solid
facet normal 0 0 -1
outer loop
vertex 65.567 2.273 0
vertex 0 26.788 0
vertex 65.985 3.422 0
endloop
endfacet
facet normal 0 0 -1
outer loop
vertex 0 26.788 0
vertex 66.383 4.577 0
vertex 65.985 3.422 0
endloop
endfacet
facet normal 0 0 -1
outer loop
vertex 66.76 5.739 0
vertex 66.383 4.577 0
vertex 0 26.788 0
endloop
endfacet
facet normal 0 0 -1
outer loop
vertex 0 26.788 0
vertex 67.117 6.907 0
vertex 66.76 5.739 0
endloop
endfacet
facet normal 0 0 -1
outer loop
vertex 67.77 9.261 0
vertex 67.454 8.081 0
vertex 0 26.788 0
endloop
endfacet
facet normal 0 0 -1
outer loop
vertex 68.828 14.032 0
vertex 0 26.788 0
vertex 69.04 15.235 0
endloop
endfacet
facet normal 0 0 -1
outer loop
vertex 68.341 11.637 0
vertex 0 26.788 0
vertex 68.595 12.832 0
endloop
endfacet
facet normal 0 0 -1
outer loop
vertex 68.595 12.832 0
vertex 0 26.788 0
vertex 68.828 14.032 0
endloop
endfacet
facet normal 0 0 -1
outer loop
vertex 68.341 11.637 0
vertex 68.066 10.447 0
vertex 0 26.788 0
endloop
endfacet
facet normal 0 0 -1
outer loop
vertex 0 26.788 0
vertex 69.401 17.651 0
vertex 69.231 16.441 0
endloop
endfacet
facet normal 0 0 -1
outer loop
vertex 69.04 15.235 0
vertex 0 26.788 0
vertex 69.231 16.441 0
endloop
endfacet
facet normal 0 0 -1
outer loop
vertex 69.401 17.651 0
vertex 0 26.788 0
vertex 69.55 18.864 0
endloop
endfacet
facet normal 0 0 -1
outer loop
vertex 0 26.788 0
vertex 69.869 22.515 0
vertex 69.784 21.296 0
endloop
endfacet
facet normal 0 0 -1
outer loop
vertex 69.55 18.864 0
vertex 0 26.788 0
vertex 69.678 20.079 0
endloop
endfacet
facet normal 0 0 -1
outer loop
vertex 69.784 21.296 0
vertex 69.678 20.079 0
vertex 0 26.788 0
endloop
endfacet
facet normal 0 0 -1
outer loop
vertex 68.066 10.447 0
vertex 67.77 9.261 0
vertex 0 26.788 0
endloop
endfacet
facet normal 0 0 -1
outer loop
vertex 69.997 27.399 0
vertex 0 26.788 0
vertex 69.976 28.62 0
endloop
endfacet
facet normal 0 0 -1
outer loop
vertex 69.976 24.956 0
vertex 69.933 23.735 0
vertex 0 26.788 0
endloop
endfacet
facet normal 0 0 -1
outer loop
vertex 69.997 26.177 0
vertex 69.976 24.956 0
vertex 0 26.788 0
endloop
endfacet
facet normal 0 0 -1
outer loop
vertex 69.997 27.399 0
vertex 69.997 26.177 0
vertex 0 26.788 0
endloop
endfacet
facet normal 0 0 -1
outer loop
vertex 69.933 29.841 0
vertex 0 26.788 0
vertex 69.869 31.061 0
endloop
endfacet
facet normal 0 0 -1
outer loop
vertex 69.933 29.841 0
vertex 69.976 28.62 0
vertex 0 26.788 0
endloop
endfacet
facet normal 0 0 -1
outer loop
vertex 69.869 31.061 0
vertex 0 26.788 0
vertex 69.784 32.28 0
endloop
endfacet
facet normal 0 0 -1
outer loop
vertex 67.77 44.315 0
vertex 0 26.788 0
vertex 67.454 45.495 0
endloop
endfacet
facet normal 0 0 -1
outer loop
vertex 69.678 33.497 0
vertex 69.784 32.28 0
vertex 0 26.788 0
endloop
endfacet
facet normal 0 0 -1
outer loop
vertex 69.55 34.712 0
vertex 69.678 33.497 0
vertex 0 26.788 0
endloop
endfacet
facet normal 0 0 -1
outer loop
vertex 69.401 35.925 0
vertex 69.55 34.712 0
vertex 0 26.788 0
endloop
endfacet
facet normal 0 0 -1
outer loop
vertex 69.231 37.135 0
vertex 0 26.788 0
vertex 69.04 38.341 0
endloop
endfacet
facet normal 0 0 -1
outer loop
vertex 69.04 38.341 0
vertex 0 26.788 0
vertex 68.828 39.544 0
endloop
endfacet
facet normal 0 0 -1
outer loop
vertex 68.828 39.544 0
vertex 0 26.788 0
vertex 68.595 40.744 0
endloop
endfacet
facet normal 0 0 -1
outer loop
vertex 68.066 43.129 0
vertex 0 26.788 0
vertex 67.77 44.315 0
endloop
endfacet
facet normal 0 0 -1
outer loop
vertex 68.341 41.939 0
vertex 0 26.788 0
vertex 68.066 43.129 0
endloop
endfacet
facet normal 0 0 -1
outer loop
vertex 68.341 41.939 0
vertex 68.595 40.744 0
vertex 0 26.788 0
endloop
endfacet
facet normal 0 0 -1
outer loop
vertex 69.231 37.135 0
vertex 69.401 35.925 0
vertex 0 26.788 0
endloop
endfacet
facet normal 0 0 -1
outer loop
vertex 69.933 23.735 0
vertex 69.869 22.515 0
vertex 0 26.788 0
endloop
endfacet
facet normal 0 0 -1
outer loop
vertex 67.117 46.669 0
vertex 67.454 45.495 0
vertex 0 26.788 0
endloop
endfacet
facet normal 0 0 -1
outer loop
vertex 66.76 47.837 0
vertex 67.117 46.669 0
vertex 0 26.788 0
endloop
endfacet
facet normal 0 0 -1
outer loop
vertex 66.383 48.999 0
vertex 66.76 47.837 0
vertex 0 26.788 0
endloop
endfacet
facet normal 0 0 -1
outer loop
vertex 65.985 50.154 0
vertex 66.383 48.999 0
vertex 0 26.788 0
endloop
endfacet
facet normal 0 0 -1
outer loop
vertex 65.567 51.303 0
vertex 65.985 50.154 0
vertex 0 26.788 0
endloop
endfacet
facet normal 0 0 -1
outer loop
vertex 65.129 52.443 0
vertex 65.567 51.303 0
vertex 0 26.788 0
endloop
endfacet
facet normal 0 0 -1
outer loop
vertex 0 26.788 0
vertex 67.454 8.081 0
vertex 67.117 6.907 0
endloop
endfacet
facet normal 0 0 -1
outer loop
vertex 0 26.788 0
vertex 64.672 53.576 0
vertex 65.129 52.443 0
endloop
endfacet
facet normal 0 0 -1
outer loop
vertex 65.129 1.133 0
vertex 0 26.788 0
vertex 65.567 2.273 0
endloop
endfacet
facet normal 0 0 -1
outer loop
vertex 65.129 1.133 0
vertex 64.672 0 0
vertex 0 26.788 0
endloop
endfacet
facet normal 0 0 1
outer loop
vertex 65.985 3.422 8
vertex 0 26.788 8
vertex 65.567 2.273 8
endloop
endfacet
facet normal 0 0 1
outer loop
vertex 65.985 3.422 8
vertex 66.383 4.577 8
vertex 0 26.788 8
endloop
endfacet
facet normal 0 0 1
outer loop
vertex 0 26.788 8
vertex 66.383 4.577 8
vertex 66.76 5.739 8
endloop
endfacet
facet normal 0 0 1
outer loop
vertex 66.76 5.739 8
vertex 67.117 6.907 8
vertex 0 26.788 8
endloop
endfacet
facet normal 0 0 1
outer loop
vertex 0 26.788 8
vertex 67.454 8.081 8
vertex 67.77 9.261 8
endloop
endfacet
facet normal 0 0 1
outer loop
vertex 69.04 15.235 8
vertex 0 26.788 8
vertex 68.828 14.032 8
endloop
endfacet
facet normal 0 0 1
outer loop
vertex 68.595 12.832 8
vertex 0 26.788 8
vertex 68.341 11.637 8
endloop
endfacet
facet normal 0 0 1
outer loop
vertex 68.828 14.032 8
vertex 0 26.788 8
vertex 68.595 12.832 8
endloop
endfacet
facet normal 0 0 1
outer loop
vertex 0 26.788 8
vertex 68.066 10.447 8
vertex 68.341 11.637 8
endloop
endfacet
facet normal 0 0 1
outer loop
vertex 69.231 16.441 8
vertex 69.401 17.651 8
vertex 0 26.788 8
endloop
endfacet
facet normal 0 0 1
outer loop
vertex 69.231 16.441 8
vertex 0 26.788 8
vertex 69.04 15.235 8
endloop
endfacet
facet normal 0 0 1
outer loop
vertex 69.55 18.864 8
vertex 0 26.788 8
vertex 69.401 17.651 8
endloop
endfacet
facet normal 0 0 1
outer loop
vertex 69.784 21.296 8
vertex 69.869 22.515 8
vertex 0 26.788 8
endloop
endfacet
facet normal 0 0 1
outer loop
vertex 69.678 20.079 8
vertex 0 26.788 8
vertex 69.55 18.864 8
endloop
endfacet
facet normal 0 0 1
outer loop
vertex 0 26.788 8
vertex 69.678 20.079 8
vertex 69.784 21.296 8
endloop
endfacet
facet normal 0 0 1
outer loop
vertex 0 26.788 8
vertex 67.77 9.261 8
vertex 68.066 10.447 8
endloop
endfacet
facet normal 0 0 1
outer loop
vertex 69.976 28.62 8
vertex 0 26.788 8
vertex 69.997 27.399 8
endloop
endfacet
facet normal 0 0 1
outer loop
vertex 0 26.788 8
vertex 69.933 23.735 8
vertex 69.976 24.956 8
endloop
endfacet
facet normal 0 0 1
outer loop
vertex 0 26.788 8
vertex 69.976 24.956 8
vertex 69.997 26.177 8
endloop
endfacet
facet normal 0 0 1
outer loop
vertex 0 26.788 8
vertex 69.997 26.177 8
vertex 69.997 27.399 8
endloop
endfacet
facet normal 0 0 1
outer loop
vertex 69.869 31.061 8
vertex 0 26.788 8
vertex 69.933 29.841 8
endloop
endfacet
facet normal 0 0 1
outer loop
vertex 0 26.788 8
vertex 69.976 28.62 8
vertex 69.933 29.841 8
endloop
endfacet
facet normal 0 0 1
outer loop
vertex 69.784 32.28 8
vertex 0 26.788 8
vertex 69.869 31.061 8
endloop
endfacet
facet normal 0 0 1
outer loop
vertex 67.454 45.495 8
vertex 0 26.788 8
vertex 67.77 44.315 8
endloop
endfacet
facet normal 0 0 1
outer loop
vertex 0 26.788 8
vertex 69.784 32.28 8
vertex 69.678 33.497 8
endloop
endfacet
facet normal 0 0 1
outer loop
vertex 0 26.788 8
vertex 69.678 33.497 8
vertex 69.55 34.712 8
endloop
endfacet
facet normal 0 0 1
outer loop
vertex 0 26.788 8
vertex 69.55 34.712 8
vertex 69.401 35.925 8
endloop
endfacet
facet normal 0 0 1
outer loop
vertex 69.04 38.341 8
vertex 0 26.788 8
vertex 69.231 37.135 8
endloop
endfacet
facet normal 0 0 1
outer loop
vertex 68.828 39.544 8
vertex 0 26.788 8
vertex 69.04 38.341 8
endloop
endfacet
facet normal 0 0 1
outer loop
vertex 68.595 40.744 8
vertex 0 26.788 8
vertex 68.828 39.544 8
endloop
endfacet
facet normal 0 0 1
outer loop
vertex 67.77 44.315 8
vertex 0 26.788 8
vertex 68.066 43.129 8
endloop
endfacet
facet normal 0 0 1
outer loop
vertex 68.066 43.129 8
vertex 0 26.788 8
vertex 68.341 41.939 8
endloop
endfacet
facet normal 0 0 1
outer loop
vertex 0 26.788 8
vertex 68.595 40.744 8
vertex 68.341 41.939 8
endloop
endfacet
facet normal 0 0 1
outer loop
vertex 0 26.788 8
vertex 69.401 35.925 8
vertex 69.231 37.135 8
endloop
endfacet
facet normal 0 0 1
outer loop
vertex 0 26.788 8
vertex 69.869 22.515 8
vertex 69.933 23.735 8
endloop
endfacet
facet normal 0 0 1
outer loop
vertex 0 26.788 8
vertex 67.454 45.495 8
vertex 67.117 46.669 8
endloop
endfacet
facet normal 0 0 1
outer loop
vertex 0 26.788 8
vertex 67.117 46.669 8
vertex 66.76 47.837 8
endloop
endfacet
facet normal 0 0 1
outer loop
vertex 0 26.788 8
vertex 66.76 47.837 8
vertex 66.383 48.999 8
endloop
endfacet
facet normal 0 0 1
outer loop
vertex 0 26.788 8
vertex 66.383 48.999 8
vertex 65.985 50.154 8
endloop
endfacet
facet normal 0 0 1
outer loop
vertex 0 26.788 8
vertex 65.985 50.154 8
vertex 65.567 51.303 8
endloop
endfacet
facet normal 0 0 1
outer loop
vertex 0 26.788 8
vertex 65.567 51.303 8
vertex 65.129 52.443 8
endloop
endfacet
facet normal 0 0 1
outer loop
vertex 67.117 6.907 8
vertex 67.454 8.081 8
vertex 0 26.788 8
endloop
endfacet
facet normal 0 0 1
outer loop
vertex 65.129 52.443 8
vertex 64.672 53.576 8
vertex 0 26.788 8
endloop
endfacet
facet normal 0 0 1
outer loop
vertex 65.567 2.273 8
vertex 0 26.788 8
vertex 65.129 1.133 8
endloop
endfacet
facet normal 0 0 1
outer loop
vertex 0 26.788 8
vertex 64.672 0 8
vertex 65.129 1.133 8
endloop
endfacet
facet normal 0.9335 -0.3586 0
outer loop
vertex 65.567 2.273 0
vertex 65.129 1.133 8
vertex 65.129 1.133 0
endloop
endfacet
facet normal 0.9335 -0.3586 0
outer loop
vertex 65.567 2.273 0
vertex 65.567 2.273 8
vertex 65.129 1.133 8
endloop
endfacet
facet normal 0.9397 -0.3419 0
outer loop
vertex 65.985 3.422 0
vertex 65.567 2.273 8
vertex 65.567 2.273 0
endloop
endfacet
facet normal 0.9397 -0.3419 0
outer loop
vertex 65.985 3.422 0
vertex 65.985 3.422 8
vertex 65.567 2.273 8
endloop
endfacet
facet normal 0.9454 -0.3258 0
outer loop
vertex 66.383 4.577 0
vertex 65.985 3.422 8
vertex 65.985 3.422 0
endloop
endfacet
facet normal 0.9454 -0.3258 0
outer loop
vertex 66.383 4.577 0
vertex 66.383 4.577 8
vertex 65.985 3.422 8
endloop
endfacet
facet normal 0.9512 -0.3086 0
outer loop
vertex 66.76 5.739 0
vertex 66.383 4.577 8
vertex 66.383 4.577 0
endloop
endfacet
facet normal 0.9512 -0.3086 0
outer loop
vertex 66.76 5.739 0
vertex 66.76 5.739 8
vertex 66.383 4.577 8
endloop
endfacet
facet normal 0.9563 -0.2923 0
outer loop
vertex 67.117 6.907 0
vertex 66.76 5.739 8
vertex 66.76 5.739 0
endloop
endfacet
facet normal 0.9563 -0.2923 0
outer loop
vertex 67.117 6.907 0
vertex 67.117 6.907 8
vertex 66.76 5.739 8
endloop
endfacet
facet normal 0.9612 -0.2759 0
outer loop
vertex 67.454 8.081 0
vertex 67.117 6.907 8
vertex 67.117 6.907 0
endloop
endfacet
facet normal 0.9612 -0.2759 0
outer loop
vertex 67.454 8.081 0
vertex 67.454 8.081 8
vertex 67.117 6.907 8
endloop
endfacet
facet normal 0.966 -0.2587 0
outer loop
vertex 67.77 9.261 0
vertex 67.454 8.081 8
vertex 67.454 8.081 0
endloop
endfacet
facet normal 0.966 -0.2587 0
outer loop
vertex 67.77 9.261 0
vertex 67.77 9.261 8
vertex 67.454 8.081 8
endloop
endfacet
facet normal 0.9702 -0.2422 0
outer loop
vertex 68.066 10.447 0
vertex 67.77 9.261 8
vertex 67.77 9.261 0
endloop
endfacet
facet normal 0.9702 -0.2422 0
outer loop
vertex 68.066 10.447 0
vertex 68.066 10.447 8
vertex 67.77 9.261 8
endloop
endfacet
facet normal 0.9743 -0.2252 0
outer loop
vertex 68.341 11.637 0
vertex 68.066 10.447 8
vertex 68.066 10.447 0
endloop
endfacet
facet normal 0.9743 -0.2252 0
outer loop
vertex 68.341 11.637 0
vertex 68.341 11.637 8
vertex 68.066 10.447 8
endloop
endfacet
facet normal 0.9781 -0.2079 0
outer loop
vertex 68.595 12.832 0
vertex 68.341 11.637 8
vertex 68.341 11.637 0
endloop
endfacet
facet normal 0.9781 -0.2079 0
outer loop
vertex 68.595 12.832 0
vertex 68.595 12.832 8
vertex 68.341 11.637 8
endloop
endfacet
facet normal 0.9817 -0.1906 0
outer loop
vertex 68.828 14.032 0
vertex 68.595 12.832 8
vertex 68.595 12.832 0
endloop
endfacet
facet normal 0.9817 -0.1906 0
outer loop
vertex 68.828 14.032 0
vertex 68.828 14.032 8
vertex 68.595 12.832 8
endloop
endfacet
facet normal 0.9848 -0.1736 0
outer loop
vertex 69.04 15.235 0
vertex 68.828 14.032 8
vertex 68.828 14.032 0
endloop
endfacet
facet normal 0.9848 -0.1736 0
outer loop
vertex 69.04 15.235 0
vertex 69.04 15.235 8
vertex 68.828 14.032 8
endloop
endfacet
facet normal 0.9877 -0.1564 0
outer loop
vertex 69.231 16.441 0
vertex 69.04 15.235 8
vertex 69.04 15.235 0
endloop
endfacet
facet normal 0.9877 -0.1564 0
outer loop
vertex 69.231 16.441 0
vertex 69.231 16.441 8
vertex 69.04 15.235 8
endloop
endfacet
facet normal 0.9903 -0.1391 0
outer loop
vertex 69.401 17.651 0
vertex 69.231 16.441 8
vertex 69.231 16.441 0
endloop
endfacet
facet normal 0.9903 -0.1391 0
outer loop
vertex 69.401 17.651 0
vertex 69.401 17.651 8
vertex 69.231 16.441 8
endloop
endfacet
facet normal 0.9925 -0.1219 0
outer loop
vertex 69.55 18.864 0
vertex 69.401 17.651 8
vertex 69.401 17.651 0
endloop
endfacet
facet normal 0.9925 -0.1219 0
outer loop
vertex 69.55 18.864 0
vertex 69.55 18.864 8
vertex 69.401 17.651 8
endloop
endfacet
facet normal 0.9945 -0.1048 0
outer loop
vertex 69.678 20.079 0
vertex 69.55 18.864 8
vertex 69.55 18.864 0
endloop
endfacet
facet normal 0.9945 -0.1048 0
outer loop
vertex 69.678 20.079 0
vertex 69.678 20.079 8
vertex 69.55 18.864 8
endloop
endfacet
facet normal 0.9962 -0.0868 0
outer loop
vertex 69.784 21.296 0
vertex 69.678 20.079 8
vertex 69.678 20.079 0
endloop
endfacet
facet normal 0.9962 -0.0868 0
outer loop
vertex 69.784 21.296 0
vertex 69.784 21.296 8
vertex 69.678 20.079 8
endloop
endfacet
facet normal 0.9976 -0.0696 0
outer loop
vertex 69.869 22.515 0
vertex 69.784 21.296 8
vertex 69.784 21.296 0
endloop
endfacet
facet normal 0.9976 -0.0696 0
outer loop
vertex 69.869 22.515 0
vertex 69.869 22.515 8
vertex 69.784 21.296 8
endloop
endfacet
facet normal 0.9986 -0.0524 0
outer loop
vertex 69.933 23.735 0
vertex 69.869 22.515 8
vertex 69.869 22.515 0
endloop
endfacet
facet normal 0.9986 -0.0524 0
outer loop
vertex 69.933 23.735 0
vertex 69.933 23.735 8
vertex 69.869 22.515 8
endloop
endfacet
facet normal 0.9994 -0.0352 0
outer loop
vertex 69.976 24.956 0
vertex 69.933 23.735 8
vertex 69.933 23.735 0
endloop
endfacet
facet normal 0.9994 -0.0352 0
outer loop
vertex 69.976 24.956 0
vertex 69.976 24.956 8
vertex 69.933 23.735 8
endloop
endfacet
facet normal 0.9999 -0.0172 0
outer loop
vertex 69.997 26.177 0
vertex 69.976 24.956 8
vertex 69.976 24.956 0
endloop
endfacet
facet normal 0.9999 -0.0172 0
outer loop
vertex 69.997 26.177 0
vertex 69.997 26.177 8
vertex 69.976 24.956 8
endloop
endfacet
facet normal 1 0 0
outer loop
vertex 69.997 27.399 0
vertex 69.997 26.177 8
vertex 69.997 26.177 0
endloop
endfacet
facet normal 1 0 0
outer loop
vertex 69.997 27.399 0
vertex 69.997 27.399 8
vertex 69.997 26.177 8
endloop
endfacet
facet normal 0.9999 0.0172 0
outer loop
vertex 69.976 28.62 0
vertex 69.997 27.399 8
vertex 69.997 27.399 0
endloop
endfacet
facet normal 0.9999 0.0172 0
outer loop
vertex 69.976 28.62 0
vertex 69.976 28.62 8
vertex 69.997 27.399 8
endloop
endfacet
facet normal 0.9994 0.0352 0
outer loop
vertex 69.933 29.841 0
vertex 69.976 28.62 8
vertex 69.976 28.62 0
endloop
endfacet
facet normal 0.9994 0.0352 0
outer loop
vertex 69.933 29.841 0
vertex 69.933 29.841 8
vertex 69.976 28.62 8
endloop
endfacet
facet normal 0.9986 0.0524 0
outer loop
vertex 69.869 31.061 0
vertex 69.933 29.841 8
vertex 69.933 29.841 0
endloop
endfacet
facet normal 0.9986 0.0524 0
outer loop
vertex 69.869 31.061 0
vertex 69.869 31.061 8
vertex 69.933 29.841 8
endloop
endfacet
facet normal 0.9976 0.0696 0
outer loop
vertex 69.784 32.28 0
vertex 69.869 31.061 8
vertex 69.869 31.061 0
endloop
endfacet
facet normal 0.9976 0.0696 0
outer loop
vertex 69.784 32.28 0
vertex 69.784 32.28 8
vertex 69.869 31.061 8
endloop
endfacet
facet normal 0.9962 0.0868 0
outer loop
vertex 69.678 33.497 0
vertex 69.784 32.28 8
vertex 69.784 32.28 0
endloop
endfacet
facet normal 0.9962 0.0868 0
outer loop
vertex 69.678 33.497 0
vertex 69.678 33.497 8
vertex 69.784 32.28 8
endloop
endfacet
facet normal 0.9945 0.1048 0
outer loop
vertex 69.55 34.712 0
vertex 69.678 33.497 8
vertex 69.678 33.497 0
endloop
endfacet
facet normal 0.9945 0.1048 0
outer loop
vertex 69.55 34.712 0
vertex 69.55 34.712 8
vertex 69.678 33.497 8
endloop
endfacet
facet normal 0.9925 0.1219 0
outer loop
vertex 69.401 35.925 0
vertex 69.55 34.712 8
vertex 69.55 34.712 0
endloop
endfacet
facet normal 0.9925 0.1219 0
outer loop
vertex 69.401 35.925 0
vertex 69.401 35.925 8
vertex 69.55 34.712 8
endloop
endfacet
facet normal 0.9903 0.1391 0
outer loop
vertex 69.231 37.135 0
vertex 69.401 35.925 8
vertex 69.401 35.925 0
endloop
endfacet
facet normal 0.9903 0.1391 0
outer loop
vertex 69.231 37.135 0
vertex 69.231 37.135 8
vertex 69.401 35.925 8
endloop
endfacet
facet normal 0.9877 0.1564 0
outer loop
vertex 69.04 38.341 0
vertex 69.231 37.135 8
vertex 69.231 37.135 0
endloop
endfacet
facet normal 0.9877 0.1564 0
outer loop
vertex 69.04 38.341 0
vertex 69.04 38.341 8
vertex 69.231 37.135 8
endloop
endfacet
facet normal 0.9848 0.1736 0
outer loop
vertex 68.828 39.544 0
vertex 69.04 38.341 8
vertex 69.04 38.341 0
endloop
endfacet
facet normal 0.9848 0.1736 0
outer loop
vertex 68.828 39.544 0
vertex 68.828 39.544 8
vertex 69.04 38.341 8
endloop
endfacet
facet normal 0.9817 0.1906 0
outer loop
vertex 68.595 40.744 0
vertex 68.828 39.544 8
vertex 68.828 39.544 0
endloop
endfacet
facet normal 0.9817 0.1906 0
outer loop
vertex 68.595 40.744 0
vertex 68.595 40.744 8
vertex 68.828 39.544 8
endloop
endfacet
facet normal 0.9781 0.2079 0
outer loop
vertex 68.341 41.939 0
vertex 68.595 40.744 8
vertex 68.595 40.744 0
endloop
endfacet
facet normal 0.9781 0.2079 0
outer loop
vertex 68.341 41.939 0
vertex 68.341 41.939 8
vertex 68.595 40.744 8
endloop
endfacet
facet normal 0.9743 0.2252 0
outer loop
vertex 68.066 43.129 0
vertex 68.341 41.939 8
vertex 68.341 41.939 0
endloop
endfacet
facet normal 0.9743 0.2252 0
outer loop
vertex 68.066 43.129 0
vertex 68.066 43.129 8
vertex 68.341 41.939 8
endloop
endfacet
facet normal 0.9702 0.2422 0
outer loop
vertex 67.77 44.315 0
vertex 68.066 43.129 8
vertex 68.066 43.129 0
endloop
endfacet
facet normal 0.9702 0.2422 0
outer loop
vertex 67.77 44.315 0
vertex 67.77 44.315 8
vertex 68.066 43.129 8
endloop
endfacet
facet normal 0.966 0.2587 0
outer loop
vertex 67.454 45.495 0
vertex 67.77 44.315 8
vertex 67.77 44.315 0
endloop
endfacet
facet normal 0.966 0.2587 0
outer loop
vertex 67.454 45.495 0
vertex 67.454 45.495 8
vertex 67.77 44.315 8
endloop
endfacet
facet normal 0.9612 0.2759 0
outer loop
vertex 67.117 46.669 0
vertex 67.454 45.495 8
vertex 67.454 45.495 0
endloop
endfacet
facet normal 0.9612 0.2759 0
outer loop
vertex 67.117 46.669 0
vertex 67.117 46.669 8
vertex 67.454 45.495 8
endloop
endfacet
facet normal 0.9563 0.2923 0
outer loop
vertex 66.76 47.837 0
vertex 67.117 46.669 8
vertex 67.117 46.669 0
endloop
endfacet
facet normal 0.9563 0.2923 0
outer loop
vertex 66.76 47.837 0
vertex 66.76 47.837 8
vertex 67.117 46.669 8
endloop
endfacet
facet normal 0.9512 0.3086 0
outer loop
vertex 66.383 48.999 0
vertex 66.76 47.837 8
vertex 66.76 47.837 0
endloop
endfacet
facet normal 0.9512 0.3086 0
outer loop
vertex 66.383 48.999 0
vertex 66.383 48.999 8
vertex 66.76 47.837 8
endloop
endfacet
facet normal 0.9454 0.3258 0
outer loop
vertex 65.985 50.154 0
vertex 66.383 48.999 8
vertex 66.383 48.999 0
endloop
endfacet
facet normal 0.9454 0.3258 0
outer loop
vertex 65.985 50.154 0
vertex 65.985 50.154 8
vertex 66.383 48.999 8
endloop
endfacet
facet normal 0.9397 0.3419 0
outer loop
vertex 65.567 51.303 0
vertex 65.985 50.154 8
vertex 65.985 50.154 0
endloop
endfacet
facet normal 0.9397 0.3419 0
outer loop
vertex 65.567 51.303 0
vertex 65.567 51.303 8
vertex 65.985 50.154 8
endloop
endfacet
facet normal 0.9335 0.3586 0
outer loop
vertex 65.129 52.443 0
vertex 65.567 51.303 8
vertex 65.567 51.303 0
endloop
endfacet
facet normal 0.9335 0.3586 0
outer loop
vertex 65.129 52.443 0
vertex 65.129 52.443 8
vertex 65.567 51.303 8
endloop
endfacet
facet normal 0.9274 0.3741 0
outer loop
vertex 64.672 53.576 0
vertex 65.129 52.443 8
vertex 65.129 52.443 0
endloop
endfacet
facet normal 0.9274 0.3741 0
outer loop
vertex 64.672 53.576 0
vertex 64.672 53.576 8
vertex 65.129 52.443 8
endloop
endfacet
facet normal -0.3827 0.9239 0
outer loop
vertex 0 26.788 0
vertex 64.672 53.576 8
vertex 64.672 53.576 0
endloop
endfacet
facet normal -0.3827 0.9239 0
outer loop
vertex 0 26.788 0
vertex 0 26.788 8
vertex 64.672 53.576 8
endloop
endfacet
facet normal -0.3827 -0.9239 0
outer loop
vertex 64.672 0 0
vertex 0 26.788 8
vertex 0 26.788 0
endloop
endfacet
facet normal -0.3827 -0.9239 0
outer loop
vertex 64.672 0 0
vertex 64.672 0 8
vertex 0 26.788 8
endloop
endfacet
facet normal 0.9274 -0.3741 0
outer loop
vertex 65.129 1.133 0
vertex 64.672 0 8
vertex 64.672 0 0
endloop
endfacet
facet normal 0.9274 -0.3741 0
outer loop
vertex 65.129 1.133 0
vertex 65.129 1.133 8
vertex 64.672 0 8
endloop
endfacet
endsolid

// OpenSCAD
$fn = 32;

// ----------------------------------------------------------------------
// Arc profile plate: sector, 47 points
// ----------------------------------------------------------------------

// --- parameters (mm) ---
sector_angle = 45;        // sector angle, degrees
sector_r = 70;            // outer radius
arc_step = 1;             // sampling step of the arc, degrees
plate_t = 8;              // plate thickness, Z

bbox_x = 2 * sector_r * sin(sector_angle / 2);  // chord of the sector
bbox_y = sector_r;  // depth of the sector (apex to arc)

profile = [[64.672, 0], [65.129, 1.133], [65.567, 2.273], [65.985, 3.422], [66.383, 4.577], [66.76, 5.739], [67.117, 6.907], [67.454, 8.081], [67.77, 9.261], [68.066, 10.447], [68.341, 11.637], [68.595, 12.832], [68.828, 14.032], [69.04, 15.235], [69.231, 16.441], [69.401, 17.651], [69.55, 18.864], [69.678, 20.079], [69.784, 21.296], [69.869, 22.515], [69.933, 23.735], [69.976, 24.956], [69.997, 26.177], [69.997, 27.399], [69.976, 28.62], [69.933, 29.841], [69.869, 31.061], [69.784, 32.28], [69.678, 33.497], [69.55, 34.712], [69.401, 35.925], [69.231, 37.135], [69.04, 38.341], [68.828, 39.544], [68.595, 40.744], [68.341, 41.939], [68.066, 43.129], [67.77, 44.315], [67.454, 45.495], [67.117, 46.669], [66.76, 47.837], [66.383, 48.999], [65.985, 50.154], [65.567, 51.303], [65.129, 52.443], [64.672, 53.576], [0, 26.788]];  // primary outline, 47 points, counter clockwise

// --- the one profile operation ---
linear_extrude(height = plate_t) polygon(points = profile);
